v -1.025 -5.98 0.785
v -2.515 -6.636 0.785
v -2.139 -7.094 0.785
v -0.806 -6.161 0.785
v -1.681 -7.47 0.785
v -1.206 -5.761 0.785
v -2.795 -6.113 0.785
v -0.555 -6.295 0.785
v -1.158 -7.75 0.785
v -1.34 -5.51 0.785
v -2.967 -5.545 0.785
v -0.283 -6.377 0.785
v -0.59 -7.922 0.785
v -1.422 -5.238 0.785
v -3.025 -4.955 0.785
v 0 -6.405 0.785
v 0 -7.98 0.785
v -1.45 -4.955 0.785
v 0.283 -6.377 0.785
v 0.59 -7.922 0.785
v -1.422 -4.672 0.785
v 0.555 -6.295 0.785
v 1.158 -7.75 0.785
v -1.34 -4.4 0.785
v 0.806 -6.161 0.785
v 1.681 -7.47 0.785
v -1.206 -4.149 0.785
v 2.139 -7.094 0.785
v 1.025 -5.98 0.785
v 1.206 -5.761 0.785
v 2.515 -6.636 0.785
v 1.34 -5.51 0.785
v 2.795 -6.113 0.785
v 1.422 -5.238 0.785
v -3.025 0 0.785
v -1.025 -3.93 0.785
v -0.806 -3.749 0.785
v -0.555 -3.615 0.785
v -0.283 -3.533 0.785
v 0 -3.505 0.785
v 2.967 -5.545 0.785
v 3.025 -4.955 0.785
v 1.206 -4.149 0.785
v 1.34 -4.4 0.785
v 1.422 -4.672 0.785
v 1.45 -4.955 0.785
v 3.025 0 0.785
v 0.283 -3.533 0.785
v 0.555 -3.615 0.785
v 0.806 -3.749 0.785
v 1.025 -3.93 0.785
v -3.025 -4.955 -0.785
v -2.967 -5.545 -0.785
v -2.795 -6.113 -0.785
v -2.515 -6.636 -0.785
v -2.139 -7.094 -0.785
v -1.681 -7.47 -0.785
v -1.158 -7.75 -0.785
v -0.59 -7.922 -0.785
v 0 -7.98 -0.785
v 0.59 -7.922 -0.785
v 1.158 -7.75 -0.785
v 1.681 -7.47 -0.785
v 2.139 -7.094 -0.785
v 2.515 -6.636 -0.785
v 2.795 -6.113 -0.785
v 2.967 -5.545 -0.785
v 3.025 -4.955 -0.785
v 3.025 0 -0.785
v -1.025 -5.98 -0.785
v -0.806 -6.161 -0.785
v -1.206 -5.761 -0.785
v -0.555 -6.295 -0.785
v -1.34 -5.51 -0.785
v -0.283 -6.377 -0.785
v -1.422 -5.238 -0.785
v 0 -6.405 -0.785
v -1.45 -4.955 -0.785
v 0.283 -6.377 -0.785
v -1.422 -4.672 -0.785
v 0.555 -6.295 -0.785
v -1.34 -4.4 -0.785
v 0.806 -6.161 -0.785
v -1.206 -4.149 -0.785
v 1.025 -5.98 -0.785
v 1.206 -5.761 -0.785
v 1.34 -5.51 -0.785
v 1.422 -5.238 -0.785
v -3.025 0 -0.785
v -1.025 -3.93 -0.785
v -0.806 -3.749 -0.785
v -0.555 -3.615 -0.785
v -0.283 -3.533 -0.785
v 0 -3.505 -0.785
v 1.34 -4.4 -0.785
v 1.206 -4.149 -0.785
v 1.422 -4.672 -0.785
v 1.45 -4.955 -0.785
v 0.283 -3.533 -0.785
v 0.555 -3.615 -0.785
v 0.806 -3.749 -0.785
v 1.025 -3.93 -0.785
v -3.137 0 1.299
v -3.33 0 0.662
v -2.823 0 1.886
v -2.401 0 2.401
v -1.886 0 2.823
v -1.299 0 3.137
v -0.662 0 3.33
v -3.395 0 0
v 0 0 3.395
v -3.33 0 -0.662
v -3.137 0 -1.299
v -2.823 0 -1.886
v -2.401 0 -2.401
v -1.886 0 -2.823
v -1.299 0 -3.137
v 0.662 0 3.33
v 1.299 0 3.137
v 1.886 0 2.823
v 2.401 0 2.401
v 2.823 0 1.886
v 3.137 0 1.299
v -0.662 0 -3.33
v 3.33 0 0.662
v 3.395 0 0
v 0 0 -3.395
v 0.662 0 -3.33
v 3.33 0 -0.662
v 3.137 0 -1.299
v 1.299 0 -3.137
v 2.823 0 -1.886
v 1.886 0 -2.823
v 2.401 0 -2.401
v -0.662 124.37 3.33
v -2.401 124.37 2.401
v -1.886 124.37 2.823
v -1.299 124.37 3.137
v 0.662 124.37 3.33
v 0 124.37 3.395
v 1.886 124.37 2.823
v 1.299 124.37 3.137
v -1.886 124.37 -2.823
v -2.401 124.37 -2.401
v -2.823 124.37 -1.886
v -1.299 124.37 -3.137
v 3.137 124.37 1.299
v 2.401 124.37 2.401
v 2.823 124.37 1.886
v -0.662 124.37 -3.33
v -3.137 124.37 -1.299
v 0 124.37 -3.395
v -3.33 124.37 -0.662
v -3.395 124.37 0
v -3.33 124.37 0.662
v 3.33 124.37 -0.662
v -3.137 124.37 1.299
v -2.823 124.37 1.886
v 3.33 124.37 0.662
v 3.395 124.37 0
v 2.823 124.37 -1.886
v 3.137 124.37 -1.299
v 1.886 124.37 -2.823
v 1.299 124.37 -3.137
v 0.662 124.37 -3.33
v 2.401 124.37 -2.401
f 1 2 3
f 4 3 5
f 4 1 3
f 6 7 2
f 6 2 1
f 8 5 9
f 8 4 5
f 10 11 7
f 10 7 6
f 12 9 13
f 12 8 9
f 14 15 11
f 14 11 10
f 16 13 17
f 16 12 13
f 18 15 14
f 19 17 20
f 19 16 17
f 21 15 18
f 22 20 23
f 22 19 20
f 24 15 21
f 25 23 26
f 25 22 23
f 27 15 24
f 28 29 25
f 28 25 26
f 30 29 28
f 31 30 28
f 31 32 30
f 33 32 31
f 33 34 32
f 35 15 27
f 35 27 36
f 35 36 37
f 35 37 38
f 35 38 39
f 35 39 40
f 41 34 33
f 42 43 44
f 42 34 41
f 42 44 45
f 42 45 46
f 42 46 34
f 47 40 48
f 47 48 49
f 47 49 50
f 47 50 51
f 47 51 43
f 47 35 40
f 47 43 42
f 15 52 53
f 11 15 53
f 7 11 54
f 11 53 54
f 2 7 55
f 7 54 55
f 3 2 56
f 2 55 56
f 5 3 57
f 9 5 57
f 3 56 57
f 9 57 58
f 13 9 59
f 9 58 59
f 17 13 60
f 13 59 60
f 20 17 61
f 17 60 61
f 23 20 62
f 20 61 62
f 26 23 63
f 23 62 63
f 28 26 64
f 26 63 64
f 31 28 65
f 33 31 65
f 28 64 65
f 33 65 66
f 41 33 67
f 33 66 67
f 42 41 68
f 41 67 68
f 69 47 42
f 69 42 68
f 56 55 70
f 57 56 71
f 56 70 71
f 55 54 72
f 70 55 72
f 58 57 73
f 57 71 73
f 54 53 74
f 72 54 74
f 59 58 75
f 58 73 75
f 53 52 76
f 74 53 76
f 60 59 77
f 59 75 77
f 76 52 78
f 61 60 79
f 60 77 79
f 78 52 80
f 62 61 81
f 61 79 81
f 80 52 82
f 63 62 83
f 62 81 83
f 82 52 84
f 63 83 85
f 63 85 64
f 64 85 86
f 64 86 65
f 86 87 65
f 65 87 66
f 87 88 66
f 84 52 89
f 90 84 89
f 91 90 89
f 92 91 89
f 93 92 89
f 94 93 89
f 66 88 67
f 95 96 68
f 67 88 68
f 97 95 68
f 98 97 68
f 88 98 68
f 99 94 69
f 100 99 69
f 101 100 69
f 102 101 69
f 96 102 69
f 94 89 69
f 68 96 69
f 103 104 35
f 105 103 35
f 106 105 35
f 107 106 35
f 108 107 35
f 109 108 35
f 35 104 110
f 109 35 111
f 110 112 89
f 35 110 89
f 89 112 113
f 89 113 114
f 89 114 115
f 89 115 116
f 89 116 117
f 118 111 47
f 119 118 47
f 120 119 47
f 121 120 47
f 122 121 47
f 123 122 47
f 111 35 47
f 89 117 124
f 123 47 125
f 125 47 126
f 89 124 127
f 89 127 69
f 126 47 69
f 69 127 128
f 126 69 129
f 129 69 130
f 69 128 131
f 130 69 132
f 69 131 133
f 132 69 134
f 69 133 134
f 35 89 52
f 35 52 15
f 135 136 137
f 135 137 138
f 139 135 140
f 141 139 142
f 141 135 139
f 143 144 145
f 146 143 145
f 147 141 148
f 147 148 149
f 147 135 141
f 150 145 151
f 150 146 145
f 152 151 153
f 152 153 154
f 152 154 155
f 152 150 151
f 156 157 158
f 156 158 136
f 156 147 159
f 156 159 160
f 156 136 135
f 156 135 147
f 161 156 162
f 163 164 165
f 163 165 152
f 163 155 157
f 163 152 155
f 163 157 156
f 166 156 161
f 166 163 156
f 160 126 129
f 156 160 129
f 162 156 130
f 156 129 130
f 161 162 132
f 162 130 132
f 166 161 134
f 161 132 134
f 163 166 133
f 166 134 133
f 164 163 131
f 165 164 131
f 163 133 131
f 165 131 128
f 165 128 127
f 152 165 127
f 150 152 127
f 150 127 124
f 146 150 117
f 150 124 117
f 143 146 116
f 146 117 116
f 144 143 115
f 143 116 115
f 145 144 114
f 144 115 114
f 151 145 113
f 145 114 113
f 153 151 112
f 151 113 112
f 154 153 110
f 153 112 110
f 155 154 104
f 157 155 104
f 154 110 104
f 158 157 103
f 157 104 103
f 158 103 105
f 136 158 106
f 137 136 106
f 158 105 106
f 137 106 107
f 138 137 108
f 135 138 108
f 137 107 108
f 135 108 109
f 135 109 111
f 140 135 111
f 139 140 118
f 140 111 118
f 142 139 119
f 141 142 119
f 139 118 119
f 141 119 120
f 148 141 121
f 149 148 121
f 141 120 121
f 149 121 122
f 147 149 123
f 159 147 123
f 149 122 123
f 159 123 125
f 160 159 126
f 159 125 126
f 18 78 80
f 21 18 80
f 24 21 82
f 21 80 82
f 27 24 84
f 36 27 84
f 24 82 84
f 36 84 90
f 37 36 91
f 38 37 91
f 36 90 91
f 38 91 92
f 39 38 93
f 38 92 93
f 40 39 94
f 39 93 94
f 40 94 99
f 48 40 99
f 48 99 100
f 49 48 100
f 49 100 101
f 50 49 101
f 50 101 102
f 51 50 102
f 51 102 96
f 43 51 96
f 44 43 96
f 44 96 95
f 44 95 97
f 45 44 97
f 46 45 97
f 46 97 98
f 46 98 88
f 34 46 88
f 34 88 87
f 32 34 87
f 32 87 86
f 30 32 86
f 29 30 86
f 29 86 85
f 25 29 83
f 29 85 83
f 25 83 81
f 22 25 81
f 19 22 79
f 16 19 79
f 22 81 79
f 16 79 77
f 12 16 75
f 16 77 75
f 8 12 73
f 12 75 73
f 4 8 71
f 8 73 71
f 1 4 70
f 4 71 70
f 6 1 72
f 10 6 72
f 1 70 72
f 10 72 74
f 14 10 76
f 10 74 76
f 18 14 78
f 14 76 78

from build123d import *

# Parameters (mm, degrees)
SKETCH1_R           = 3.395
BOSS_EXTRUDE1_DEPTH = 124.37
SKETCH3_W           = 6.05
SKETCH3_H           = 0.785
BOSS_EXTRUDE2_DEPTH = 7.98
CUT_EXTRUDE1_DEPTH  = 7.98
SKETCH5_R           = 1.45
CUT_EXTRUDE2_DEPTH  = 7.98


with BuildPart() as part:
    # Sketch1 → Boss-Extrude1 (new body)
    with BuildSketch(Plane(origin=(0, 0, 0), x_dir=(1, 0, 0), z_dir=(0, 1, 0))):
        Circle(SKETCH1_R)
    extrude(amount=BOSS_EXTRUDE1_DEPTH)

    # Sketch3 → Boss-Extrude2 (add)
    with BuildSketch(Plane(origin=(0, 0, 0), x_dir=(1, 0, 0), z_dir=(0, 1, 0))):
        with Locations((0, 0.3925)):
            Rectangle(SKETCH3_W, SKETCH3_H)
        with Locations((0, -0.3925)):
            Rectangle(SKETCH3_W, SKETCH3_H)
    extrude(amount=-BOSS_EXTRUDE2_DEPTH)

    # Sketch4 → Cut-Extrude1 (cut)
    with BuildSketch(Plane(origin=(0, 0, -0.785), x_dir=(-1, 0, 0), z_dir=(0, 0, -1))):
        with BuildLine():
            Line((-3.025, -4.955), (-5.551253647, -4.955))
            Line((-5.551253647, -4.955), (-3.356299124, -8.834088681))
            Line((-3.356299124, -8.834088681), (4.987206478, -9.531994941))
            Line((4.987206478, -9.531994941), (4.886235873, -4.955))
            Line((4.886235873, -4.955), (3.025, -4.955))
            ThreePointArc((3.025, -4.955), (0, -7.98), (-3.025, -4.955))
        make_face()
    extrude(amount=-CUT_EXTRUDE1_DEPTH, mode=Mode.SUBTRACT)

    # Sketch5 → Cut-Extrude2 (cut)
    with BuildSketch(Plane(origin=(0, 0, -0.785), x_dir=(-1, 0, 0), z_dir=(0, 0, -1))):
        with Locations((0, -4.955)):
            Circle(SKETCH5_R)
    extrude(amount=-CUT_EXTRUDE2_DEPTH, mode=Mode.SUBTRACT)


solid = part.part
